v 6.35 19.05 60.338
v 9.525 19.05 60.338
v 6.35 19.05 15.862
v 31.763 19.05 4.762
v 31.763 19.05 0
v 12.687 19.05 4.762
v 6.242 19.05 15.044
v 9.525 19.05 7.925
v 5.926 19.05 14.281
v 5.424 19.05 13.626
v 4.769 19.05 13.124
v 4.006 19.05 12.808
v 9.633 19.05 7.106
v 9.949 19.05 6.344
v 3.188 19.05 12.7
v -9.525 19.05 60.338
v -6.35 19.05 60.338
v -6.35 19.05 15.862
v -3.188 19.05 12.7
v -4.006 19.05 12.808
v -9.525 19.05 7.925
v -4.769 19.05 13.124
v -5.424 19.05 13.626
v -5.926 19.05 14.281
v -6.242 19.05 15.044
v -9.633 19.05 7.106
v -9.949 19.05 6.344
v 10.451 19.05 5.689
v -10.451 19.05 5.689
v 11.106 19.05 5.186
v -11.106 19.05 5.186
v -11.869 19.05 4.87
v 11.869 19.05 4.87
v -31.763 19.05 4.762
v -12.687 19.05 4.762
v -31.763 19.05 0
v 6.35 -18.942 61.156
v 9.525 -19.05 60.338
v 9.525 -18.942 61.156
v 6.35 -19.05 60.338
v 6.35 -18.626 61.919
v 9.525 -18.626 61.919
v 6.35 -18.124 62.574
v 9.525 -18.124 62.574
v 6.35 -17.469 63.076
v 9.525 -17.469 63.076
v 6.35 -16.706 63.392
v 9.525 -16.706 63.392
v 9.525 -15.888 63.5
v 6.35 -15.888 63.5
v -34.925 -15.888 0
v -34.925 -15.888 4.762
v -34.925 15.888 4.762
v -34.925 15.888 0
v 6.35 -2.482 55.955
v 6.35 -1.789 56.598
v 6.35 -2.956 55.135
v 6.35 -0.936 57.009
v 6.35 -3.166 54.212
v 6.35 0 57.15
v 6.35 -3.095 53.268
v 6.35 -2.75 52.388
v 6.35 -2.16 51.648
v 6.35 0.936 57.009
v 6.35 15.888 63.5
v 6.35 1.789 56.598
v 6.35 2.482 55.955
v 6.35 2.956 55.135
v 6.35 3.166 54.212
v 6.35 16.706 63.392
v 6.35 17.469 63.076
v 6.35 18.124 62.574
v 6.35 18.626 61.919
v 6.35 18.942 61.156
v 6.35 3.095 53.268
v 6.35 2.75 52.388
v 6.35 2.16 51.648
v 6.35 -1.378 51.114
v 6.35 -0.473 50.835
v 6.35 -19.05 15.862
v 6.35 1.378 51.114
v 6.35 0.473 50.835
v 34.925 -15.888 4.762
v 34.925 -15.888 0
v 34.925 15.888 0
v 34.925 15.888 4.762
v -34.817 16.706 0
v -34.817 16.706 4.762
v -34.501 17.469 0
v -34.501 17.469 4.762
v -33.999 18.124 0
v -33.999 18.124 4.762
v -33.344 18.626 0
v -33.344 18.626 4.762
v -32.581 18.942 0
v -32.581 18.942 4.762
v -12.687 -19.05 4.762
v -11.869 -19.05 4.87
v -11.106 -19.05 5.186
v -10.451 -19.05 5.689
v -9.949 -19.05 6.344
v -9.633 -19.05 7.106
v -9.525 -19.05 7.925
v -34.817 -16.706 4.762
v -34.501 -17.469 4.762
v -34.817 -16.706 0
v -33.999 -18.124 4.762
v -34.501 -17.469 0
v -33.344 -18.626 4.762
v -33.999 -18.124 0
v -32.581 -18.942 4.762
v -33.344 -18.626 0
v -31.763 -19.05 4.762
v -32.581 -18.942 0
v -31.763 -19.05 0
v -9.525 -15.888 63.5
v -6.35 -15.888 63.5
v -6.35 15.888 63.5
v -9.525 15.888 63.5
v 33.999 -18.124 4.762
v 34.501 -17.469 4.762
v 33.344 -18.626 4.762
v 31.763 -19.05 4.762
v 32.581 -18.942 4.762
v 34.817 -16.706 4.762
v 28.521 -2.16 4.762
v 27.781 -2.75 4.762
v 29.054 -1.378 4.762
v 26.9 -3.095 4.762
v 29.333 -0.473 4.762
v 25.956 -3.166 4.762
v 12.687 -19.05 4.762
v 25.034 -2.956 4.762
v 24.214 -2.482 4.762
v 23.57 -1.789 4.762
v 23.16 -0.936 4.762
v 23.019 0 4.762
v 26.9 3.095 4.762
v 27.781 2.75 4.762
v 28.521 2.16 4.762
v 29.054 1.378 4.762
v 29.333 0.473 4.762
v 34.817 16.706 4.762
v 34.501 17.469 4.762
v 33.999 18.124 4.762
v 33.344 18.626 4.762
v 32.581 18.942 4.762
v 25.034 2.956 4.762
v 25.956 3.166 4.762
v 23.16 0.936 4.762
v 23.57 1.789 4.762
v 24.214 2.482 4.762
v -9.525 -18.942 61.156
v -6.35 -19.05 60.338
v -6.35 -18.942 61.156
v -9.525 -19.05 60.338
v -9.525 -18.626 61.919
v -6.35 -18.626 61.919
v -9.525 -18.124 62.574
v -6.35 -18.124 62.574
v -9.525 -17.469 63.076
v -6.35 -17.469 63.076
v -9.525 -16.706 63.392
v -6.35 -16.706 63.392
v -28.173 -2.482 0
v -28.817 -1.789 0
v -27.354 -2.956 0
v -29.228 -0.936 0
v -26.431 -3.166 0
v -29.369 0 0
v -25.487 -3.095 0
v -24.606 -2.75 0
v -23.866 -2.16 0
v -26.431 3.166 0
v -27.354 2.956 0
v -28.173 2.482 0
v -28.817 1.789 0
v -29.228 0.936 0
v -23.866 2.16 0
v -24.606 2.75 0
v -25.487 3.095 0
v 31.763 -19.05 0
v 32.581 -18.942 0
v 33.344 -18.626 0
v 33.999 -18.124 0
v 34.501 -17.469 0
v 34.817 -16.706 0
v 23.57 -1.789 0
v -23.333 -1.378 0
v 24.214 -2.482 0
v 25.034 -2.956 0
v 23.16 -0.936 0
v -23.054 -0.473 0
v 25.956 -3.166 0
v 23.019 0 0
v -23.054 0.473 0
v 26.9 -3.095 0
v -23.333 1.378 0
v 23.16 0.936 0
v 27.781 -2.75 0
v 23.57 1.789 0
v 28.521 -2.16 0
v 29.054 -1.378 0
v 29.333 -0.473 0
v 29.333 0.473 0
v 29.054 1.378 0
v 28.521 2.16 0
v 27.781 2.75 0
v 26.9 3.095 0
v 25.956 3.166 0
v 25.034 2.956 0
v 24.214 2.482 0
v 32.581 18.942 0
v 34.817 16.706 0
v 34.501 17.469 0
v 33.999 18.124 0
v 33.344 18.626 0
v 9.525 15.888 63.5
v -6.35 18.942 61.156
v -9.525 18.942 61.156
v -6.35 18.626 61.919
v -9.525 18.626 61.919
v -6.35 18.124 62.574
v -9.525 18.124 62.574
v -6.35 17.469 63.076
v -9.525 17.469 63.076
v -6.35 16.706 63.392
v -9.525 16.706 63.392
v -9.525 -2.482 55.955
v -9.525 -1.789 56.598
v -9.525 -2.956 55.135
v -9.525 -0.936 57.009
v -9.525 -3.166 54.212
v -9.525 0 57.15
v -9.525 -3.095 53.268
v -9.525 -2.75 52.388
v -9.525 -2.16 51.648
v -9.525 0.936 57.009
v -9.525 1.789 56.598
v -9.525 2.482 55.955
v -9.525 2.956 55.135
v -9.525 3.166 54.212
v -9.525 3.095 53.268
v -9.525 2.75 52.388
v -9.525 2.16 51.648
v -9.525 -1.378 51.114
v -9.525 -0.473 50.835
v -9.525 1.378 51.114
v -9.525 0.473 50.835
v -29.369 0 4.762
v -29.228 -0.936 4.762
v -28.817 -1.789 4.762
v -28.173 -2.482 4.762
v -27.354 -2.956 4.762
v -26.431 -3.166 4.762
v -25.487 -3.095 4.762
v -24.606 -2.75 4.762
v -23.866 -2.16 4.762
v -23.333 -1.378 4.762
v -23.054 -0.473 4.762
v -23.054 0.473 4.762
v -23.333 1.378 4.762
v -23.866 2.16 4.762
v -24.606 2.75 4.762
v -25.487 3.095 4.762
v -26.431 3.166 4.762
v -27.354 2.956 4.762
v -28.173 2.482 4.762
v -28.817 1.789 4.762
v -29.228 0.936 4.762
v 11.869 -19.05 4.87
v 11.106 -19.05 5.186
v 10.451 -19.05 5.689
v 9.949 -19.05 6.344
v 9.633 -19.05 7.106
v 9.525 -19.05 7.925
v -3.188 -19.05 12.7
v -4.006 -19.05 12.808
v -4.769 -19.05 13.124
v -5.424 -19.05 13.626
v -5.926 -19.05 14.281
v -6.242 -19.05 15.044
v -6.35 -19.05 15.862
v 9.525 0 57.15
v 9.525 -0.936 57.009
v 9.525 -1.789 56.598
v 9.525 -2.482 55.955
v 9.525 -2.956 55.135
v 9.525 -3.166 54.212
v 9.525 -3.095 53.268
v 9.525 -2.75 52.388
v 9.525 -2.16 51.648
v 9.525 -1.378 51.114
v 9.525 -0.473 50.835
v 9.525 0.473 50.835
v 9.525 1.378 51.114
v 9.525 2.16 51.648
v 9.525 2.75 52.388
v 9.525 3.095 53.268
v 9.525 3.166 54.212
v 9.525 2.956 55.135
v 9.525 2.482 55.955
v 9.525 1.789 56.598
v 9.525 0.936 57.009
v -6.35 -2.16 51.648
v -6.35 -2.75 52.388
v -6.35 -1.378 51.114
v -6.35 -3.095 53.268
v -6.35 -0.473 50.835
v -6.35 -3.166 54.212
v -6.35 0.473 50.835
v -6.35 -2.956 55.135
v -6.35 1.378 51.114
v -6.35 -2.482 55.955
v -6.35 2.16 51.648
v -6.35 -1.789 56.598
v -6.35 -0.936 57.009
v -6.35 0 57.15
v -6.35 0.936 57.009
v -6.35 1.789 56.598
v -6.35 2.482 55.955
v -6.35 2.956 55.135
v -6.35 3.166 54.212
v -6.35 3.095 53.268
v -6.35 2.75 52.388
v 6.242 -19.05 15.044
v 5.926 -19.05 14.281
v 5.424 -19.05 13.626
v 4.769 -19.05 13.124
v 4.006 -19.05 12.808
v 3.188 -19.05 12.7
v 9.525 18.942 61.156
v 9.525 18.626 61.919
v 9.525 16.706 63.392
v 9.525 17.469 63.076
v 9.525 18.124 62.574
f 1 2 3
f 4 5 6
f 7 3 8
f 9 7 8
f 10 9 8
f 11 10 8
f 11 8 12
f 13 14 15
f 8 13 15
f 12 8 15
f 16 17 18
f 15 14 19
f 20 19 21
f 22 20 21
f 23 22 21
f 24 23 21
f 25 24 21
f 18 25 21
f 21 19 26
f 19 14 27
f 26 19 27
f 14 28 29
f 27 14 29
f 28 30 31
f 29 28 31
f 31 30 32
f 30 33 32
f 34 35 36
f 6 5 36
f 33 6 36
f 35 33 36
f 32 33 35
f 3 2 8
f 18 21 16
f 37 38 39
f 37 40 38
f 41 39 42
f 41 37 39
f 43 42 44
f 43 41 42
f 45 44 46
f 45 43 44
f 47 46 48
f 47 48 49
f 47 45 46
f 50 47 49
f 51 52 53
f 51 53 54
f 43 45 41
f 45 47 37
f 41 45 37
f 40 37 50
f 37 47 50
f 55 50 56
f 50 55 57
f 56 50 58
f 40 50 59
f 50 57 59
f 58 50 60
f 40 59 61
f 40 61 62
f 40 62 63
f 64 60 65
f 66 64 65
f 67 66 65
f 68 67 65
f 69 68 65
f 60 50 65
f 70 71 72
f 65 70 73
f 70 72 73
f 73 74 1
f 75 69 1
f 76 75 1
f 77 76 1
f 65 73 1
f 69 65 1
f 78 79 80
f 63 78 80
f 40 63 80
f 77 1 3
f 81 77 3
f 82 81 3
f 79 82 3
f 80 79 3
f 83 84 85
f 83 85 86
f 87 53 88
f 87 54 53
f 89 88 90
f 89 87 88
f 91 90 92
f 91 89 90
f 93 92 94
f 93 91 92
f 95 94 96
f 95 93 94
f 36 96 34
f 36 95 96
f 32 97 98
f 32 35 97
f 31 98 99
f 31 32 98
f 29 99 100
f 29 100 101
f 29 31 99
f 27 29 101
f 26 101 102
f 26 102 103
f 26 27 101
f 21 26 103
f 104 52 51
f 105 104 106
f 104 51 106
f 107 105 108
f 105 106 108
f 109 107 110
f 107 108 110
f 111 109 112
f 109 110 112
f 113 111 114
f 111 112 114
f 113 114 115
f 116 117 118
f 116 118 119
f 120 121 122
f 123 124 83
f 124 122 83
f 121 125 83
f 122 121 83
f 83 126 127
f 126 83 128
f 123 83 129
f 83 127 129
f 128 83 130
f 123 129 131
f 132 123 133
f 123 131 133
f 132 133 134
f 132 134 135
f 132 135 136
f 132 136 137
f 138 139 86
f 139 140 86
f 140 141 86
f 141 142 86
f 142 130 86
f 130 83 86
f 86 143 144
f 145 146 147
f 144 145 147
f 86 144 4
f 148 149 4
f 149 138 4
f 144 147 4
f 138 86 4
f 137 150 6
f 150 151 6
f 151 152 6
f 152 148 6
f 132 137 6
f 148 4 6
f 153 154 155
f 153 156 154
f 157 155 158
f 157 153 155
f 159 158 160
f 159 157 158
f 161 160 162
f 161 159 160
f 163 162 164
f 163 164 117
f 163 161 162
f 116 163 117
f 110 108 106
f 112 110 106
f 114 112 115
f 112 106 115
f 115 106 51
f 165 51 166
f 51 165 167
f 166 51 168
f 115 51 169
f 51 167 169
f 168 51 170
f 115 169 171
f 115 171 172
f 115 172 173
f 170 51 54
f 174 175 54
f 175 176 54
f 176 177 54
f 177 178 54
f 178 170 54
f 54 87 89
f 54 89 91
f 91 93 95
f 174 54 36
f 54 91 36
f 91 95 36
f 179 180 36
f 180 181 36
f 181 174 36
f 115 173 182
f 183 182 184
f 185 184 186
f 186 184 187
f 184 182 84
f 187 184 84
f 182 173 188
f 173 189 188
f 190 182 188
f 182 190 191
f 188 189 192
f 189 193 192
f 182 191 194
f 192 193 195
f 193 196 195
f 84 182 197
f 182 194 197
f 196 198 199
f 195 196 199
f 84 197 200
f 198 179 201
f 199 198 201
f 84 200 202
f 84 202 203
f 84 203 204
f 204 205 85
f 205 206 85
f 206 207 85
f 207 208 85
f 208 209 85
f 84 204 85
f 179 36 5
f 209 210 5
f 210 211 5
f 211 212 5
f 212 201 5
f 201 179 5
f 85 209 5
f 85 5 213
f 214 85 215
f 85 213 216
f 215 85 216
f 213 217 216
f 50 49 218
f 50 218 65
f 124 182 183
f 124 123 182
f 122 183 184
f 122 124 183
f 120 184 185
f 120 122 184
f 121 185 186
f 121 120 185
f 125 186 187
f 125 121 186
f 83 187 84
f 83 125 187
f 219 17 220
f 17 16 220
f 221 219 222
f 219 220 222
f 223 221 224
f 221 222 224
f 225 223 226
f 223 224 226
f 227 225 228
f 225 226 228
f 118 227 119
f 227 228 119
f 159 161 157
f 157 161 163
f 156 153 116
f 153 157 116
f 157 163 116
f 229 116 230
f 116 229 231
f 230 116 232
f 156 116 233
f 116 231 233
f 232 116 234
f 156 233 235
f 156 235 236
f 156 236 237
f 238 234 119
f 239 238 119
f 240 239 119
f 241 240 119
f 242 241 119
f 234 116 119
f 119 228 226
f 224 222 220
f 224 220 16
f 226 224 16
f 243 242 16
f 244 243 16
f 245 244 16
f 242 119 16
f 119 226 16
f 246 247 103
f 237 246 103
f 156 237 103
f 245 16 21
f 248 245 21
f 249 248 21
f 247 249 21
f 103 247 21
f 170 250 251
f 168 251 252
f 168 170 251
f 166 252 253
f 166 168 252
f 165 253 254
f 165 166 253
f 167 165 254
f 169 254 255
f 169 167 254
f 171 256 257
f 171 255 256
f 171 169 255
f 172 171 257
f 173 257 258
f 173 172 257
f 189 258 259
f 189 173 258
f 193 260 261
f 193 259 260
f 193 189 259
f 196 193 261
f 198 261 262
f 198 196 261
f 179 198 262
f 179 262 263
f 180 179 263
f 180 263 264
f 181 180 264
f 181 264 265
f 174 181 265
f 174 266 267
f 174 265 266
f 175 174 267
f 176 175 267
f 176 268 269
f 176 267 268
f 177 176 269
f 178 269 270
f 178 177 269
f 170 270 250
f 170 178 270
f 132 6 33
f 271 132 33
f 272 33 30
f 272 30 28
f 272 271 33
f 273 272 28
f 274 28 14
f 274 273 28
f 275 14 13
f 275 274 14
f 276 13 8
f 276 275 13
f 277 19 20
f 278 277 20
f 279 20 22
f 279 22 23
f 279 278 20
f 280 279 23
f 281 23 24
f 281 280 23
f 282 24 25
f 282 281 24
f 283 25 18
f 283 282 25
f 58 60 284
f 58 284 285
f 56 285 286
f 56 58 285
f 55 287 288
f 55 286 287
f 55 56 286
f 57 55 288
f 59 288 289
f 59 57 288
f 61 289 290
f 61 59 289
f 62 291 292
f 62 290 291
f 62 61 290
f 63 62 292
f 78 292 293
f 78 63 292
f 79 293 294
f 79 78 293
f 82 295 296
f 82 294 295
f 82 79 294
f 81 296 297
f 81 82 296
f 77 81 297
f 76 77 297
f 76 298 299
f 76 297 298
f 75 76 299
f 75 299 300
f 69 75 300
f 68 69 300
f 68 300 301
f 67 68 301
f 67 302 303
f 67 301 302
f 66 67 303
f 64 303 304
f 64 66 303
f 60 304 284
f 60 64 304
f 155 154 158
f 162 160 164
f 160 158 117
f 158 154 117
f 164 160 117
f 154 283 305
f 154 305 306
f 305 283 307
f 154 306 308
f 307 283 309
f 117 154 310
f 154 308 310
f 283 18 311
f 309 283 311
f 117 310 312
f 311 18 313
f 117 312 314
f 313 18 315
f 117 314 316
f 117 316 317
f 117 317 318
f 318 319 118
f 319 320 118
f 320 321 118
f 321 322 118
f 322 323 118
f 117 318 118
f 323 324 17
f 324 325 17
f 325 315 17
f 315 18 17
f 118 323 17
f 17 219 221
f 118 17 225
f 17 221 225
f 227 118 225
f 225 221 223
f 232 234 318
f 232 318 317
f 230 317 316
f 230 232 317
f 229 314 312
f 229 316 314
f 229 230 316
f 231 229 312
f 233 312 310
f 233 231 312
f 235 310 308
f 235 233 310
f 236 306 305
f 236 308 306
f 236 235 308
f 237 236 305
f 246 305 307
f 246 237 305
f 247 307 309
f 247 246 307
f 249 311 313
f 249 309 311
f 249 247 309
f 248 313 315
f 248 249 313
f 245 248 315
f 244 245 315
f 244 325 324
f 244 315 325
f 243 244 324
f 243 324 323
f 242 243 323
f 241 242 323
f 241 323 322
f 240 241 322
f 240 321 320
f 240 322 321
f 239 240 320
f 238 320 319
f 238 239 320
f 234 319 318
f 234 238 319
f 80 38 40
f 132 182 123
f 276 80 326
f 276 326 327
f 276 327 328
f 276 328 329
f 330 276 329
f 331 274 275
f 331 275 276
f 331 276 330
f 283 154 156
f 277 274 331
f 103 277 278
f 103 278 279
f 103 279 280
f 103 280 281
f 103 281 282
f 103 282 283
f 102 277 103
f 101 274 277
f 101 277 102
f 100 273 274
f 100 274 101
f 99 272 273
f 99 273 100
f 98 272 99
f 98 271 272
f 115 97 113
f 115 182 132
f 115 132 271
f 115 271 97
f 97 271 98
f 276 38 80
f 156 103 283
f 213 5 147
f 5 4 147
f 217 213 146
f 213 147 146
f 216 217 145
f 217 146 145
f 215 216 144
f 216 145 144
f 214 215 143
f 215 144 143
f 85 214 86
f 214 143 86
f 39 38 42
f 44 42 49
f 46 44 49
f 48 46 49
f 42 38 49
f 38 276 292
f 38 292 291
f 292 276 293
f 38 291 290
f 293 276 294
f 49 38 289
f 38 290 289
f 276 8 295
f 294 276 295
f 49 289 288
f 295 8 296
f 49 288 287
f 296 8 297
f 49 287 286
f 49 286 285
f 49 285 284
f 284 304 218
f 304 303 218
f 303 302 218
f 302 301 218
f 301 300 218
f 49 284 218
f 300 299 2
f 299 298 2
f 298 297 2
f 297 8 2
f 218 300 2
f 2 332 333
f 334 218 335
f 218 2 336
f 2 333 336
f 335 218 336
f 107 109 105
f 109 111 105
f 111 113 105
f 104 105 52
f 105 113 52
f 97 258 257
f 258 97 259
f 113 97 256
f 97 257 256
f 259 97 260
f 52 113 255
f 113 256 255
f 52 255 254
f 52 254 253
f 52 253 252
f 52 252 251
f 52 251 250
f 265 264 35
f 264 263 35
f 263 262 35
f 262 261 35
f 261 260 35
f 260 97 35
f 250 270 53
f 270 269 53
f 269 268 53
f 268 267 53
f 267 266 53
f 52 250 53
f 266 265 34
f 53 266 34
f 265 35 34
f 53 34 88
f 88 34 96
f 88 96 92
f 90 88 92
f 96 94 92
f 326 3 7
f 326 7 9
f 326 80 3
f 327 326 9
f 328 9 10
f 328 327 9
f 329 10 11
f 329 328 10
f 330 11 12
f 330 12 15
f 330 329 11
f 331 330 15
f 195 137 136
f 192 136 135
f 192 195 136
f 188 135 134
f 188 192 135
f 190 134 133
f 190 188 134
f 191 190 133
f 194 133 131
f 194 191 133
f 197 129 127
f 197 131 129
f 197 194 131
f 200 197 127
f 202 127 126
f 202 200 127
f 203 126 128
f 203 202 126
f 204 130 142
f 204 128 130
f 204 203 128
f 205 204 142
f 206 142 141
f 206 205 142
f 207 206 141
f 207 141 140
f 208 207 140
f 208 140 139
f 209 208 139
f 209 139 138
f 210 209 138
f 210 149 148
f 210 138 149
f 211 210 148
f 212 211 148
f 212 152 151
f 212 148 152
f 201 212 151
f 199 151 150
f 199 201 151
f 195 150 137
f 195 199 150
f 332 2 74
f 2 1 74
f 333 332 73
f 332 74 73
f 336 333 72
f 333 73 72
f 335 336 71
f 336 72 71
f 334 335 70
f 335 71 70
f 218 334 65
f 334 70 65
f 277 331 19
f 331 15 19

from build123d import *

# Parameters (mm, degrees)
EXTRUDE1_DEPTH      = 19.05
SKETCH2_R           = 3.175
EXTRUDE2_DEPTH      = 75.93269063
EXTRUDE3_DEPTH      = 76.501141892
EXTRUDE3_DEPTH_BACK = 76.501141892
SKETCH3_R           = 3.175
FILLET3_R           = 3.1623


with BuildPart() as part:
    # Sketch1 → Extrude1 (new, symmetric)
    with BuildSketch(Plane(origin=(0, 0, 0), x_dir=(1, 0, 0), z_dir=(0, 1, 0))):
        Polygon((-34.925, 0), (34.925, 0), (34.925, -4.7625), (9.525, -4.7625), (9.525, -63.5), (6.35, -63.5), (6.35, -12.7), (-6.35, -12.7), (-6.35, -63.5), (-9.525, -63.5), (-9.525, -4.7625), (-34.925, -4.7625), align=None)
    extrude(amount=EXTRUDE1_DEPTH, both=True)

    # Sketch2 → Extrude2 (cut, through all)
    with BuildSketch(Plane.XY):
        with Locations(Location((-26.19375, 0, 0), (0, 0, 180))):
            Circle(SKETCH2_R)
        with Locations(Location((26.19375, 0, 0), (0, 0, 180))):
            Circle(SKETCH2_R)
    extrude(amount=EXTRUDE2_DEPTH, mode=Mode.SUBTRACT)

    # Sketch3 → Extrude3 (cut, two sides: drawn at the far end of the back side and taken through both)
    with BuildSketch(Plane(origin=(0, 0, -0.669808337), x_dir=(0, 0, -1), z_dir=(1, 0, 0)).offset(-EXTRUDE3_DEPTH_BACK)):
        with Locations(Location((-54.644808337, 0, 0), (0, 0, 180))):
            Circle(SKETCH3_R)
    extrude(amount=EXTRUDE3_DEPTH + EXTRUDE3_DEPTH_BACK, mode=Mode.SUBTRACT)

    # Fillet3
    fillet3_edges = [part.edges().sort_by_distance(p)[0] for p in [
        (-34.925, 19.05, 2.38125),
        (7.9375, -19.05, 63.5),
        (-7.9375, -19.05, 63.5),
        (-34.925, -19.05, 2.38125),
        (34.925, -19.05, 2.38125),
        (-7.9375, 19.05, 63.5),
        (9.525, 0, 4.7625),
        (6.35, 0, 12.7),
        (-6.35, 0, 12.7),
        (-9.525, 0, 4.7625),
        (7.9375, 19.05, 63.5),
        (34.925, 19.05, 2.38125),
    ]]
    fillet(fillet3_edges, radius=FILLET3_R)


solid = part.part
